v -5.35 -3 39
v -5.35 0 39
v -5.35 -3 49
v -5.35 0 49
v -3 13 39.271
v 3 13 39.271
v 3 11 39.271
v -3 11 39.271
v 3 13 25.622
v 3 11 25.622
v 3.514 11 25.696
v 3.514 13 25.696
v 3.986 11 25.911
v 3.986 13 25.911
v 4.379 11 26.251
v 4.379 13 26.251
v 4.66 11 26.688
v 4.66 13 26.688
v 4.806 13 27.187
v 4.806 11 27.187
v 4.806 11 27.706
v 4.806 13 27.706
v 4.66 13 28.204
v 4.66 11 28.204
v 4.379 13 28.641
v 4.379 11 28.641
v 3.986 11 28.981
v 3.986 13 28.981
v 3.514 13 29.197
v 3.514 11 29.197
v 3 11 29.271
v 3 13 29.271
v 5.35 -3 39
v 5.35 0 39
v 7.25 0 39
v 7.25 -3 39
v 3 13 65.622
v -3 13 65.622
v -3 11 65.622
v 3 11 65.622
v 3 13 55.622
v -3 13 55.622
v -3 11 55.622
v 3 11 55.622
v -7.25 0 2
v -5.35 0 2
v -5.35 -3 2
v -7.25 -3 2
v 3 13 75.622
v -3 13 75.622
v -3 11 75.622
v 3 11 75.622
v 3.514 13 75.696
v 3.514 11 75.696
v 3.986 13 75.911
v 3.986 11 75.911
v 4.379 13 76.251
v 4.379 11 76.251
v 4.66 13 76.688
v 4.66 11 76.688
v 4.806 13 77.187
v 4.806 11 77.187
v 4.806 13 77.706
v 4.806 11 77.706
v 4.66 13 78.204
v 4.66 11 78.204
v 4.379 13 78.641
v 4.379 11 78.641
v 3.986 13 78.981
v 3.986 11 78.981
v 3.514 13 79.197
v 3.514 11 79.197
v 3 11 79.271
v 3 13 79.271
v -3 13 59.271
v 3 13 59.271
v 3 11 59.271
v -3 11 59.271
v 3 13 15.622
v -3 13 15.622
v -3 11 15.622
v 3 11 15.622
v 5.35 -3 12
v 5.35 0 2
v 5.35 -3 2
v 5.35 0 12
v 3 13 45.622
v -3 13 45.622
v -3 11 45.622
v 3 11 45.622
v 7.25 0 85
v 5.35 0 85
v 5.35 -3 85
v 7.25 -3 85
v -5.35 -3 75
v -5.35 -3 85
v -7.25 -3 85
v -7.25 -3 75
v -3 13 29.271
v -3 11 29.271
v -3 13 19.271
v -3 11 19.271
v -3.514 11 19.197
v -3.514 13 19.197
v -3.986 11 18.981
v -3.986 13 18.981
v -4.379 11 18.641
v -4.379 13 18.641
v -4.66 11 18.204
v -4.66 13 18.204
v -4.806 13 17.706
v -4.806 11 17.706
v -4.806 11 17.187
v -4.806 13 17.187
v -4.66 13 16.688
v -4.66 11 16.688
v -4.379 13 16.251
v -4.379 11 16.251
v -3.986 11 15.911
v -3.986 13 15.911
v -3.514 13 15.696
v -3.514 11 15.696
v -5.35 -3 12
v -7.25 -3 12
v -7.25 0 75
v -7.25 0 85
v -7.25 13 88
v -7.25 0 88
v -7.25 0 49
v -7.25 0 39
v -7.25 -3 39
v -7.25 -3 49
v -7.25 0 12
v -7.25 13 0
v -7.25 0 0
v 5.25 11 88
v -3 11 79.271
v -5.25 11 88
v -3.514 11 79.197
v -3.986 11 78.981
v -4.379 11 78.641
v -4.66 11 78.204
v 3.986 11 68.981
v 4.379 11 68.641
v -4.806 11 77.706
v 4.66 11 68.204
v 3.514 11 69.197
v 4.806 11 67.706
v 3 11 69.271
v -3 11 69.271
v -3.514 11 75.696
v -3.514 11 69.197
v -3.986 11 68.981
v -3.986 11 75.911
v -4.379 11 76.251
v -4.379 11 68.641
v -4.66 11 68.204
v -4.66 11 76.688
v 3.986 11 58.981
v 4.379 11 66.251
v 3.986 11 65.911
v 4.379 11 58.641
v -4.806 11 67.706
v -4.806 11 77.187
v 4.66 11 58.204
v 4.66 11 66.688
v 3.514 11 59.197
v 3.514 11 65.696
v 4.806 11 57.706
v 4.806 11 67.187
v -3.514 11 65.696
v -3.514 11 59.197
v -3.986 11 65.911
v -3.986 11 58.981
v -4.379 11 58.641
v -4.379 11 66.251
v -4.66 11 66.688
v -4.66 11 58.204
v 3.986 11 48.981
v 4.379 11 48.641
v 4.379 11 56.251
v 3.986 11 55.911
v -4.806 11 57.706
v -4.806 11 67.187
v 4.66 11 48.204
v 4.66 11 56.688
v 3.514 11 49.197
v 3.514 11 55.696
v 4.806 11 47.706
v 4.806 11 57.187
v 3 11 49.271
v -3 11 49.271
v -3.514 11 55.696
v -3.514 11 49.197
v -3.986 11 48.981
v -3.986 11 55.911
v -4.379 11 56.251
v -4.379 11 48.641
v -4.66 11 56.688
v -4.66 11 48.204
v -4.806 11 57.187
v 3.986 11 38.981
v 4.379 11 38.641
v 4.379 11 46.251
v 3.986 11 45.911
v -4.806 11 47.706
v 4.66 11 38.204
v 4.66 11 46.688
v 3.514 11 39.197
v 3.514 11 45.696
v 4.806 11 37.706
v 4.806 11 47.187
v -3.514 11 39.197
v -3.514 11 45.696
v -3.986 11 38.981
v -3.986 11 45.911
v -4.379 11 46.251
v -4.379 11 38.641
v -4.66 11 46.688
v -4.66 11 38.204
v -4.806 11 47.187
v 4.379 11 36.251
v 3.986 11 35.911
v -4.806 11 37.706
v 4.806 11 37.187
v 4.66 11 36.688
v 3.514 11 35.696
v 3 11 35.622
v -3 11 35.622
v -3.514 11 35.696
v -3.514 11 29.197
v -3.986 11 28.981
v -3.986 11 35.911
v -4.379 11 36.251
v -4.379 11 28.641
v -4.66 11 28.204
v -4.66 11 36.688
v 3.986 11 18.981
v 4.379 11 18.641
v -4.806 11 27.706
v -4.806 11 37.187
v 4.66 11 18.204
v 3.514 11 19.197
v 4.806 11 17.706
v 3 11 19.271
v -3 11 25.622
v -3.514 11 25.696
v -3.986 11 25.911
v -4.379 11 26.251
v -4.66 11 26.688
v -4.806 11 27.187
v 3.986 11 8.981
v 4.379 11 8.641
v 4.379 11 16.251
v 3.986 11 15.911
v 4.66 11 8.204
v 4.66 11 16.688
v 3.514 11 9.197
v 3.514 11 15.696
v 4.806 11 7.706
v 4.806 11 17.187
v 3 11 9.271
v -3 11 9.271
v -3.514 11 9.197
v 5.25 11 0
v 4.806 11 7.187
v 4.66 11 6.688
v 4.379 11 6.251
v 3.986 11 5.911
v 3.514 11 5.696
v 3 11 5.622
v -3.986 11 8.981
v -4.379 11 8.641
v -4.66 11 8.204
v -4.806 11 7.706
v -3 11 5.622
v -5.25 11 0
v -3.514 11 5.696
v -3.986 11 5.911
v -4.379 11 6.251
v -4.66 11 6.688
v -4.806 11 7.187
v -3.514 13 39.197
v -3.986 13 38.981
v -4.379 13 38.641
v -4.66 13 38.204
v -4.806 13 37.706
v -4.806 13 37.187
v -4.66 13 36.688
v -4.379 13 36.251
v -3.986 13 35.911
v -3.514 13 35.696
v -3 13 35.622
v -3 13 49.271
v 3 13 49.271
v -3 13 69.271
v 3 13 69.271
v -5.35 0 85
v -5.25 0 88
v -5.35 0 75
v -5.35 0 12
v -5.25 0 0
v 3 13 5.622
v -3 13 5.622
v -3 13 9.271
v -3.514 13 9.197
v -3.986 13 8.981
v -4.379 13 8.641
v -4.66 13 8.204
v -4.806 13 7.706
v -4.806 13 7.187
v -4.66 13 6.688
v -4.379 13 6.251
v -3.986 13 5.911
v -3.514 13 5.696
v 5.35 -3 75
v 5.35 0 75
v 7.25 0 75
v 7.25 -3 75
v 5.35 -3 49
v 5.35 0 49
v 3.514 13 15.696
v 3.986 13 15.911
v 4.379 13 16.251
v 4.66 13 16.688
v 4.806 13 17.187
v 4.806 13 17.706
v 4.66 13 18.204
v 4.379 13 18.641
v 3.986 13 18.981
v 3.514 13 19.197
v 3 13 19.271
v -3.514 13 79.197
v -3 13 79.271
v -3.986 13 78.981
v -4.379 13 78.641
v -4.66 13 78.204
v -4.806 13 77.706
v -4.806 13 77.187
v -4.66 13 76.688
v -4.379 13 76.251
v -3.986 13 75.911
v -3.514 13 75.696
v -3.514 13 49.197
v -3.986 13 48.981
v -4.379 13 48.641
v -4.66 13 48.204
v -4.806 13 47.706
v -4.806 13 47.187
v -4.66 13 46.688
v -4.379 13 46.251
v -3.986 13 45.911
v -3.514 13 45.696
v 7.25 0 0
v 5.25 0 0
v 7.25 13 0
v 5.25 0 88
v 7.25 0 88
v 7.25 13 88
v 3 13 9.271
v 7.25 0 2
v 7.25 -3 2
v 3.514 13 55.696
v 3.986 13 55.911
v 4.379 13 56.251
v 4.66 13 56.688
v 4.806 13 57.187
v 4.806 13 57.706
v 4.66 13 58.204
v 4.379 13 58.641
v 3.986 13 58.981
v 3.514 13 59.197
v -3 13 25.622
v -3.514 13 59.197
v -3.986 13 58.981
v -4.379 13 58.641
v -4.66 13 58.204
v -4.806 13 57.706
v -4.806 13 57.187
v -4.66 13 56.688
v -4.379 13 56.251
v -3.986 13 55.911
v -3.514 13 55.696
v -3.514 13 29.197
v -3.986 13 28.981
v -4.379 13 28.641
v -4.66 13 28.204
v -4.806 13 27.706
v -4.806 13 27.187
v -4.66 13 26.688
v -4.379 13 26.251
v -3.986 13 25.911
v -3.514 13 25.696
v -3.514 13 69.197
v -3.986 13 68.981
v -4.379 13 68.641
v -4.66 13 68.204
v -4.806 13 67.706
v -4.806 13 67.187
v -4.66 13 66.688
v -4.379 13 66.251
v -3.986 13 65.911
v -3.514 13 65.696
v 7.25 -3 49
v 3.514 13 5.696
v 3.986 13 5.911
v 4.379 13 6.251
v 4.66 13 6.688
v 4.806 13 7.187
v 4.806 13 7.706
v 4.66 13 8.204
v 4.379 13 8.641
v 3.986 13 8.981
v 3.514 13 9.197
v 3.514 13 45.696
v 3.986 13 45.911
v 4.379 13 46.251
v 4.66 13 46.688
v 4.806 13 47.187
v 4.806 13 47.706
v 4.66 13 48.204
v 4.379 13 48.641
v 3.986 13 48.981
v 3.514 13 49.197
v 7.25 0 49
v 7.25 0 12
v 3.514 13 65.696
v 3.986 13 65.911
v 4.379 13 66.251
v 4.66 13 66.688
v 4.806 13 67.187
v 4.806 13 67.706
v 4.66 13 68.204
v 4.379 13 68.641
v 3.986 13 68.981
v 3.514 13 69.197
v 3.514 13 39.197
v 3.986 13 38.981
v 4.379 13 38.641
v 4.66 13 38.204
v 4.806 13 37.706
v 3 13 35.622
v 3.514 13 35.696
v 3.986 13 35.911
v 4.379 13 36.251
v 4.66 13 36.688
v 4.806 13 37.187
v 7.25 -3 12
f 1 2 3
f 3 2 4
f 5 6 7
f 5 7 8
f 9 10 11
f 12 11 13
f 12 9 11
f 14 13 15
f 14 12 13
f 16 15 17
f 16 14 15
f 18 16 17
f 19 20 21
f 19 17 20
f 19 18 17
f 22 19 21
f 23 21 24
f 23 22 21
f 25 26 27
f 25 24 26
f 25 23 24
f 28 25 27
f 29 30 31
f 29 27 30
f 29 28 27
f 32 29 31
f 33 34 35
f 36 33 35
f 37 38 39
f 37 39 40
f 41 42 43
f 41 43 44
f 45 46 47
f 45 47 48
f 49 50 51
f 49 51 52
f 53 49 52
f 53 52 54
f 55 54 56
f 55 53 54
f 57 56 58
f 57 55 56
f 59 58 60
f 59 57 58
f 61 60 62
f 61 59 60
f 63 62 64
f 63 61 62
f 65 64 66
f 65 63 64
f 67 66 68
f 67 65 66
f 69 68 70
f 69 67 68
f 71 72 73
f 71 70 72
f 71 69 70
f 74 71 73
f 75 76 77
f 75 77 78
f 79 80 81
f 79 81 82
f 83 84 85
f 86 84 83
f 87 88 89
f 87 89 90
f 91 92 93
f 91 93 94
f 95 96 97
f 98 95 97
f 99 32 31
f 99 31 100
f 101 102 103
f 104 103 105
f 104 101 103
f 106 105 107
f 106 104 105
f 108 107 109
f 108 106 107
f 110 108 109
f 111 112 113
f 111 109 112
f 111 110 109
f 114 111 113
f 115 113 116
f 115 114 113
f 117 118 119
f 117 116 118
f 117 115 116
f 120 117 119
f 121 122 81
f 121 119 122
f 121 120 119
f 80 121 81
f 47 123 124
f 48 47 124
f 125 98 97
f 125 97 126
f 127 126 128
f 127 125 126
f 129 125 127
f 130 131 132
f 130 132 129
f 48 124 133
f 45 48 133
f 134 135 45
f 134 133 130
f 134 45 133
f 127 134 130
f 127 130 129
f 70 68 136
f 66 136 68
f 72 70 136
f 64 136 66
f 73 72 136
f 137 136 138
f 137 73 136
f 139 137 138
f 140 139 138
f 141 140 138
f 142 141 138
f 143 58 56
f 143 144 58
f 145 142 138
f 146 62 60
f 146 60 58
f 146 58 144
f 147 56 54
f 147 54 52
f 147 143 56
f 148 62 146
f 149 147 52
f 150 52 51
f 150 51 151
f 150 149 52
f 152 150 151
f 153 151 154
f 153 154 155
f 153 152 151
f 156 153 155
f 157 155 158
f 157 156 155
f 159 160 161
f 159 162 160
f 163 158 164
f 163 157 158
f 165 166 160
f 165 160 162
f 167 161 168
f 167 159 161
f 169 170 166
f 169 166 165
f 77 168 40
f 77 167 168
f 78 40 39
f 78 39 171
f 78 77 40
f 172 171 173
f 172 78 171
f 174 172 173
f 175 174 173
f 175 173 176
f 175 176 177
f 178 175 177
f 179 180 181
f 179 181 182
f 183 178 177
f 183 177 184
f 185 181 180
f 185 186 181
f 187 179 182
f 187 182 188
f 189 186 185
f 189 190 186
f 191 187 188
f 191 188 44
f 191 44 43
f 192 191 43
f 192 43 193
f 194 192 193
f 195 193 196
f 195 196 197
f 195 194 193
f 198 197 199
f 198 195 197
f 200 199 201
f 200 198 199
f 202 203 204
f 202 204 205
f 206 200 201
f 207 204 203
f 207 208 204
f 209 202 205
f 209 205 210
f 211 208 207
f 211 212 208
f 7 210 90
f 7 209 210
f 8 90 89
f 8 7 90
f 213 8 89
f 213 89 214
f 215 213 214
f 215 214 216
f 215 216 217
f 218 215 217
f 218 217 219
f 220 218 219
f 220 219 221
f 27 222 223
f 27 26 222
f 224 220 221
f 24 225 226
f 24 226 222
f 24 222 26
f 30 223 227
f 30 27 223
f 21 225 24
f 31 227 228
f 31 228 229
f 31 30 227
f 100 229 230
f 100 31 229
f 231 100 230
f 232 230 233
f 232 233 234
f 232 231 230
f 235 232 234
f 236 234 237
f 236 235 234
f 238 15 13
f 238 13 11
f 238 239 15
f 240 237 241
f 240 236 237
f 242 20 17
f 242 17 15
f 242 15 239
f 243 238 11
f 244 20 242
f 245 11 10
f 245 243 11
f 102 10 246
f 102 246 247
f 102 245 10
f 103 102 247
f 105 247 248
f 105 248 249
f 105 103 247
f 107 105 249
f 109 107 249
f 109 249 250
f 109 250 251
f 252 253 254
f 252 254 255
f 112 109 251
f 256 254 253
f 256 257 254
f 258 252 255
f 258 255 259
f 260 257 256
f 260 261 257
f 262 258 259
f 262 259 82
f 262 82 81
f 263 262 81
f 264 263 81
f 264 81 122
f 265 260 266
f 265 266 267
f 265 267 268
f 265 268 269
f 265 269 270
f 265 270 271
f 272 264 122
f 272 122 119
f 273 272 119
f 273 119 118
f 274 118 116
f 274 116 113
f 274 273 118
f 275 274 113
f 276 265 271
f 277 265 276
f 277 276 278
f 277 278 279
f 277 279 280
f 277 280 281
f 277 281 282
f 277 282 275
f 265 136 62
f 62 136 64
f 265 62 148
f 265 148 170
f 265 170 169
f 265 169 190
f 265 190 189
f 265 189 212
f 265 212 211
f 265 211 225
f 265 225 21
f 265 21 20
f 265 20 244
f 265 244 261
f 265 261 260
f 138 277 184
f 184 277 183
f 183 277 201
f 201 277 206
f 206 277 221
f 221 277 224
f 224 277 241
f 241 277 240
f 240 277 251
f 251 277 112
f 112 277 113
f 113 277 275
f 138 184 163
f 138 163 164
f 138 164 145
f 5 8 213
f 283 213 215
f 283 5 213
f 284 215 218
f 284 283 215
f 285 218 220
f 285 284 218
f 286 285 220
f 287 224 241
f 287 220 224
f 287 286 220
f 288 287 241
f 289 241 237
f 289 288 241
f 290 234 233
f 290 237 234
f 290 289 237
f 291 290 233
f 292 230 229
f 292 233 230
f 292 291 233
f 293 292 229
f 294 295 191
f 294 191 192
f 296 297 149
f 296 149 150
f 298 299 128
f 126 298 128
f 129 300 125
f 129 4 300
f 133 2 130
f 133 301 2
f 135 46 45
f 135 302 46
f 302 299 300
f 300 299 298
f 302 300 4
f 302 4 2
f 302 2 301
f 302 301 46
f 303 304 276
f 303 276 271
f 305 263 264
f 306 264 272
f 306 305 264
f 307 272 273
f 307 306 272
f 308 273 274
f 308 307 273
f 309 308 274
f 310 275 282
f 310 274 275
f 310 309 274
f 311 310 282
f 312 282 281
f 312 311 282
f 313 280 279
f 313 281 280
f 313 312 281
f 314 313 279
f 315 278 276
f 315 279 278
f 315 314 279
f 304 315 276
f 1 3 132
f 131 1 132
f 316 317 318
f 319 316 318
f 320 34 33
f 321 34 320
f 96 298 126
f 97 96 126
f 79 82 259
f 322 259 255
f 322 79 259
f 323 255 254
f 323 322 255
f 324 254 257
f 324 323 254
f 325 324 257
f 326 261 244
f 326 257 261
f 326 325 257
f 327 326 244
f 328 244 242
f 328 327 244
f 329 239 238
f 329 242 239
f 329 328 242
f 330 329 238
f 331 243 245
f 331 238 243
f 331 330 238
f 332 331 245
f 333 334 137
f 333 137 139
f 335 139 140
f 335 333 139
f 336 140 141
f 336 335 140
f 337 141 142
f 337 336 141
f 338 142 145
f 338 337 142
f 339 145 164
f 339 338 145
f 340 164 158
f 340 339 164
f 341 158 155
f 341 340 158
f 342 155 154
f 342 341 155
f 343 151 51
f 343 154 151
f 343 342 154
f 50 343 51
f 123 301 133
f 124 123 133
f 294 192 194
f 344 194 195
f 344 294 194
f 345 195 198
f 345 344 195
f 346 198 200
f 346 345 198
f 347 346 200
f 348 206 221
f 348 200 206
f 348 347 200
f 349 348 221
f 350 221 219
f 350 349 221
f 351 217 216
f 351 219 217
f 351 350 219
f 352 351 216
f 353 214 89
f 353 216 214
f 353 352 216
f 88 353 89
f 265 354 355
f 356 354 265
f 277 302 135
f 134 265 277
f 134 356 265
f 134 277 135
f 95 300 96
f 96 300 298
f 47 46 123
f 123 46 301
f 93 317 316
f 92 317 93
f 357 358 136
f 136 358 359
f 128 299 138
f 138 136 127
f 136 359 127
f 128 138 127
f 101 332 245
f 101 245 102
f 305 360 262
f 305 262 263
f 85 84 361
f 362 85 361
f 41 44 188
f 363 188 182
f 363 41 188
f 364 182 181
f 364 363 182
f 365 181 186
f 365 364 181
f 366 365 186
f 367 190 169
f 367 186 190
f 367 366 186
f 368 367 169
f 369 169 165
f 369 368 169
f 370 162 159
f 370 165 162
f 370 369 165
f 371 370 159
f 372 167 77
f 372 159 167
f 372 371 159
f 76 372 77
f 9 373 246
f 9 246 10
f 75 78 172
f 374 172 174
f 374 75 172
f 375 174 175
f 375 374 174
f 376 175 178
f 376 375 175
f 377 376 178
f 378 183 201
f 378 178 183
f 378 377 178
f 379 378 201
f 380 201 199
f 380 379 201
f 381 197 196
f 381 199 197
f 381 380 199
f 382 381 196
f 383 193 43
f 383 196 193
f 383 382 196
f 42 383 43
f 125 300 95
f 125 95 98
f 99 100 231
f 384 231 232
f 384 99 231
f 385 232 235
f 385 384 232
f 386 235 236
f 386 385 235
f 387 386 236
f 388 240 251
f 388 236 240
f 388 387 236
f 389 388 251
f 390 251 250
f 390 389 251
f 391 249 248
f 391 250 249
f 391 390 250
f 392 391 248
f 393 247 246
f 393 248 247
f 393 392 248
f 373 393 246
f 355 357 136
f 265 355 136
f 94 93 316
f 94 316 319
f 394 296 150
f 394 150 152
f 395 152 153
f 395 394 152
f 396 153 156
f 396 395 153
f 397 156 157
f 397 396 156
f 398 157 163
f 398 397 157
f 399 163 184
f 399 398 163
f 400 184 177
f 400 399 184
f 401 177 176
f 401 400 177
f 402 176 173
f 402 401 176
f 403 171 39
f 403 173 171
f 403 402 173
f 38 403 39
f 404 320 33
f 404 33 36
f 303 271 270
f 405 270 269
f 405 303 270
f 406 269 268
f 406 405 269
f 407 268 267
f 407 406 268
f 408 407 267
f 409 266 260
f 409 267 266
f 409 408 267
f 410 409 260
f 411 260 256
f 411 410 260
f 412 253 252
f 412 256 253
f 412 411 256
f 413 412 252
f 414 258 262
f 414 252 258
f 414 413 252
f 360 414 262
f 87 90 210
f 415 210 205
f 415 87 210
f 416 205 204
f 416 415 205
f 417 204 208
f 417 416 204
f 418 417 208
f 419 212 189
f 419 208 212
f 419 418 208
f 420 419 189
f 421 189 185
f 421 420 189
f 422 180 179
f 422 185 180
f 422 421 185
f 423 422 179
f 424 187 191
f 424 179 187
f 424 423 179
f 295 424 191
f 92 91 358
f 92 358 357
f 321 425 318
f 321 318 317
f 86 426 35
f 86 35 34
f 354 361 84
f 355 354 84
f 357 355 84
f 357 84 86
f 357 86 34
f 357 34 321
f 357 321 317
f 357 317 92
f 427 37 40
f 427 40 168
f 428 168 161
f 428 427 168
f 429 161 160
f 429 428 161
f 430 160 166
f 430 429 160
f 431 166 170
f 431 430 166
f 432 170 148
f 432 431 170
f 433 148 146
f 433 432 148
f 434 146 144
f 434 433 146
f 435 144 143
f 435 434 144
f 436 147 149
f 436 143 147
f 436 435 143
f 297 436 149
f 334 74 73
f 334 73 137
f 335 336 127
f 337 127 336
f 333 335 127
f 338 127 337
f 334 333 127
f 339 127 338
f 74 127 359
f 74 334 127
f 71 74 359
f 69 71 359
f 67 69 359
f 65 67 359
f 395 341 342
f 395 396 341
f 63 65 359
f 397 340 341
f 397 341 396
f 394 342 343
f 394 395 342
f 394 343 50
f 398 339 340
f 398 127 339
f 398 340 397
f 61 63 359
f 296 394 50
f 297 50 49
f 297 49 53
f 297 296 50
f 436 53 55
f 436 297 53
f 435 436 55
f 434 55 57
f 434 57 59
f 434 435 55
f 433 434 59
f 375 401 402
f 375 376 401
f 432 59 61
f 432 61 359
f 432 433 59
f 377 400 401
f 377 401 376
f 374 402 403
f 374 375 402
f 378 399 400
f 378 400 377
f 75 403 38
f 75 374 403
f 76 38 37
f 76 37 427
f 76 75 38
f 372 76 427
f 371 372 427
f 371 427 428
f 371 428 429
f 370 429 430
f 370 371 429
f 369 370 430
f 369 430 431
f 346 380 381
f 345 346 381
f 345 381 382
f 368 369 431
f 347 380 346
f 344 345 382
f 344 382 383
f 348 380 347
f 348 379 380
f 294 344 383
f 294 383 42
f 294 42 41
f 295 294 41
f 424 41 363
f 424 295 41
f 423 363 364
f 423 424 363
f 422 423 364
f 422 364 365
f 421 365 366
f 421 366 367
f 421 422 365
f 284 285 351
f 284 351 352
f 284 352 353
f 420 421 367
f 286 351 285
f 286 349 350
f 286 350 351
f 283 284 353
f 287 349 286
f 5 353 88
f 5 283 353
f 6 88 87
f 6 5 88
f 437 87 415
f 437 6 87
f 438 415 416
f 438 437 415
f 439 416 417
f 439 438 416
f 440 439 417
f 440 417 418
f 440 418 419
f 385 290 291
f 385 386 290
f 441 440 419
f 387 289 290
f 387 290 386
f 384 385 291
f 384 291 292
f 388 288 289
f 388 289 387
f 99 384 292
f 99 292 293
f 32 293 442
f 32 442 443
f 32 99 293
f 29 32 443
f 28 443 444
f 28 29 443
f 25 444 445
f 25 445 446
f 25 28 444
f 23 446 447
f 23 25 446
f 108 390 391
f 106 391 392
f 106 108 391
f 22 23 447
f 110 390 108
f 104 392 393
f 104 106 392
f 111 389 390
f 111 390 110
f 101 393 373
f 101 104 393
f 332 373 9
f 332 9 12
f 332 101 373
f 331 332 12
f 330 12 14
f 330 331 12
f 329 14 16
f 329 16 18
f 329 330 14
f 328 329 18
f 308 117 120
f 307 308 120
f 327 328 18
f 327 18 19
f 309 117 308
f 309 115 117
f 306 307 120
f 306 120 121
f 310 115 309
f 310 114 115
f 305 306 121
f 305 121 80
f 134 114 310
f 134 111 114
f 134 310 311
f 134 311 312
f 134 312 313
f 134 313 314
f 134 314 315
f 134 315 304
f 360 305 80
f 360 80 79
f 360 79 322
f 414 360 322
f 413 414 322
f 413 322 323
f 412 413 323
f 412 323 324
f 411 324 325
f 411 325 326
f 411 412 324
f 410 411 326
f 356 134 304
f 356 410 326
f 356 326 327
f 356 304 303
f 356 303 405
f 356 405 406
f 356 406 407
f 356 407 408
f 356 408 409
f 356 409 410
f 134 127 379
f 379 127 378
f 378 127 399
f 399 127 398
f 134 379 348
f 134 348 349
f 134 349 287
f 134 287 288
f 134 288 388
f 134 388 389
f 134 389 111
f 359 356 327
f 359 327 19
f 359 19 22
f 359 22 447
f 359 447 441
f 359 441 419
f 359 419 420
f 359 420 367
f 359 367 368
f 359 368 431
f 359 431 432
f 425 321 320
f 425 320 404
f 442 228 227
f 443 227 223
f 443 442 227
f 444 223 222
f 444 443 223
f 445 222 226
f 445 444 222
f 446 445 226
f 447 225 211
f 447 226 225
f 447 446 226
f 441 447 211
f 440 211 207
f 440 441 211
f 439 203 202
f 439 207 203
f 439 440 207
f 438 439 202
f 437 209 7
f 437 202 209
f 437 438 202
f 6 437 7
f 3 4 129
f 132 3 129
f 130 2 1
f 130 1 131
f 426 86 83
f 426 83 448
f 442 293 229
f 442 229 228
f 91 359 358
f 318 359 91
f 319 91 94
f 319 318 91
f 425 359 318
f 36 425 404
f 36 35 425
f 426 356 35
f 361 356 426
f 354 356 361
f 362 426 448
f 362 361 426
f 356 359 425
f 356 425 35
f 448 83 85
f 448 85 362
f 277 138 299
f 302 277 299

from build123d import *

# Parameters (mm, degrees)
EXTRUDE_1_DEPTH     = 88
CUT_EXTRUDE_1_DEPTH = 55
SKETCH_4_W          = 1.9
SKETCH_4_H          = 10
EXTRUDE_2_DEPTH     = 3


with BuildPart() as part:
    # 草图1 → 凸台-拉伸1 (new body)
    with BuildSketch(Plane.XY):
        Polygon((-7.25, 0), (-7.25, 13), (7.25, 13), (7.25, 0), (5.25, 0), (5.25, 11), (-5.25, 11), (-5.25, 0), align=None)
    extrude(amount=EXTRUDE_1_DEPTH)

    # 草图2 → 切除-拉伸1 (cut)
    with BuildSketch(Plane(origin=(0, 13, 0), x_dir=(1, 0, 0), z_dir=(0, 1, 0))):
        with BuildLine():
            Line((-3, -5.621760717), (3, -5.621760717))
            ThreePointArc((3, -5.621760717), (4.824580314, -7.44634103), (3, -9.270921344))
            Line((3, -9.270921344), (-3, -9.270921344))
            ThreePointArc((-3, -9.270921344), (-4.824580314, -7.44634103), (-3, -5.621760717))
        make_face()
        with BuildLine():
            Line((-3, -15.621760717), (3, -15.621760717))
            ThreePointArc((3, -15.621760717), (4.824580314, -17.44634103), (3, -19.270921344))
            Line((3, -19.270921344), (-3, -19.270921344))
            ThreePointArc((-3, -19.270921344), (-4.824580314, -17.44634103), (-3, -15.621760717))
        make_face()
        with BuildLine():
            Line((-3, -25.621760717), (3, -25.621760717))
            ThreePointArc((3, -25.621760717), (4.824580314, -27.44634103), (3, -29.270921344))
            Line((3, -29.270921344), (-3, -29.270921344))
            ThreePointArc((-3, -29.270921344), (-4.824580314, -27.44634103), (-3, -25.621760717))
        make_face()
        with BuildLine():
            Line((-3, -35.621760717), (3, -35.621760717))
            ThreePointArc((3, -35.621760717), (4.824580314, -37.44634103), (3, -39.270921344))
            Line((3, -39.270921344), (-3, -39.270921344))
            ThreePointArc((-3, -39.270921344), (-4.824580314, -37.44634103), (-3, -35.621760717))
        make_face()
        with BuildLine():
            Line((-3, -45.621760717), (3, -45.621760717))
            ThreePointArc((3, -45.621760717), (4.824580314, -47.44634103), (3, -49.270921344))
            Line((3, -49.270921344), (-3, -49.270921344))
            ThreePointArc((-3, -49.270921344), (-4.824580314, -47.44634103), (-3, -45.621760717))
        make_face()
        with BuildLine():
            Line((-3, -55.621760717), (3, -55.621760717))
            ThreePointArc((3, -55.621760717), (4.824580314, -57.44634103), (3, -59.270921344))
            Line((3, -59.270921344), (-3, -59.270921344))
            ThreePointArc((-3, -59.270921344), (-4.824580314, -57.44634103), (-3, -55.621760717))
        make_face()
        with BuildLine():
            Line((-3, -65.621760717), (3, -65.621760717))
            ThreePointArc((3, -65.621760717), (4.824580314, -67.44634103), (3, -69.270921344))
            Line((3, -69.270921344), (-3, -69.270921344))
            ThreePointArc((-3, -69.270921344), (-4.824580314, -67.44634103), (-3, -65.621760717))
        make_face()
        with BuildLine():
            Line((-3, -75.621760717), (3, -75.621760717))
            ThreePointArc((3, -75.621760717), (4.824580314, -77.44634103), (3, -79.270921344))
            Line((3, -79.270921344), (-3, -79.270921344))
            ThreePointArc((-3, -79.270921344), (-4.824580314, -77.44634103), (-3, -75.621760717))
        make_face()
    extrude(amount=-CUT_EXTRUDE_1_DEPTH, mode=Mode.SUBTRACT)

    # 草图4 → 凸台-拉伸2 (add)
    with BuildSketch(Plane.XZ):
        with Locations((6.3, 80)):
            Rectangle(SKETCH_4_W, SKETCH_4_H)
        with Locations((6.3, 44)):
            Rectangle(SKETCH_4_W, SKETCH_4_H)
        with Locations((6.3, 7)):
            Rectangle(SKETCH_4_W, SKETCH_4_H)
    extrude_2 = extrude(amount=EXTRUDE_2_DEPTH)

    # 镜向1: 凸台-拉伸2 across plane
    add(extrude_2.mirror(Plane(origin=(0, 0, 0), x_dir=(0, 0, 1), z_dir=(1, 0, 0))))


solid = part.part
